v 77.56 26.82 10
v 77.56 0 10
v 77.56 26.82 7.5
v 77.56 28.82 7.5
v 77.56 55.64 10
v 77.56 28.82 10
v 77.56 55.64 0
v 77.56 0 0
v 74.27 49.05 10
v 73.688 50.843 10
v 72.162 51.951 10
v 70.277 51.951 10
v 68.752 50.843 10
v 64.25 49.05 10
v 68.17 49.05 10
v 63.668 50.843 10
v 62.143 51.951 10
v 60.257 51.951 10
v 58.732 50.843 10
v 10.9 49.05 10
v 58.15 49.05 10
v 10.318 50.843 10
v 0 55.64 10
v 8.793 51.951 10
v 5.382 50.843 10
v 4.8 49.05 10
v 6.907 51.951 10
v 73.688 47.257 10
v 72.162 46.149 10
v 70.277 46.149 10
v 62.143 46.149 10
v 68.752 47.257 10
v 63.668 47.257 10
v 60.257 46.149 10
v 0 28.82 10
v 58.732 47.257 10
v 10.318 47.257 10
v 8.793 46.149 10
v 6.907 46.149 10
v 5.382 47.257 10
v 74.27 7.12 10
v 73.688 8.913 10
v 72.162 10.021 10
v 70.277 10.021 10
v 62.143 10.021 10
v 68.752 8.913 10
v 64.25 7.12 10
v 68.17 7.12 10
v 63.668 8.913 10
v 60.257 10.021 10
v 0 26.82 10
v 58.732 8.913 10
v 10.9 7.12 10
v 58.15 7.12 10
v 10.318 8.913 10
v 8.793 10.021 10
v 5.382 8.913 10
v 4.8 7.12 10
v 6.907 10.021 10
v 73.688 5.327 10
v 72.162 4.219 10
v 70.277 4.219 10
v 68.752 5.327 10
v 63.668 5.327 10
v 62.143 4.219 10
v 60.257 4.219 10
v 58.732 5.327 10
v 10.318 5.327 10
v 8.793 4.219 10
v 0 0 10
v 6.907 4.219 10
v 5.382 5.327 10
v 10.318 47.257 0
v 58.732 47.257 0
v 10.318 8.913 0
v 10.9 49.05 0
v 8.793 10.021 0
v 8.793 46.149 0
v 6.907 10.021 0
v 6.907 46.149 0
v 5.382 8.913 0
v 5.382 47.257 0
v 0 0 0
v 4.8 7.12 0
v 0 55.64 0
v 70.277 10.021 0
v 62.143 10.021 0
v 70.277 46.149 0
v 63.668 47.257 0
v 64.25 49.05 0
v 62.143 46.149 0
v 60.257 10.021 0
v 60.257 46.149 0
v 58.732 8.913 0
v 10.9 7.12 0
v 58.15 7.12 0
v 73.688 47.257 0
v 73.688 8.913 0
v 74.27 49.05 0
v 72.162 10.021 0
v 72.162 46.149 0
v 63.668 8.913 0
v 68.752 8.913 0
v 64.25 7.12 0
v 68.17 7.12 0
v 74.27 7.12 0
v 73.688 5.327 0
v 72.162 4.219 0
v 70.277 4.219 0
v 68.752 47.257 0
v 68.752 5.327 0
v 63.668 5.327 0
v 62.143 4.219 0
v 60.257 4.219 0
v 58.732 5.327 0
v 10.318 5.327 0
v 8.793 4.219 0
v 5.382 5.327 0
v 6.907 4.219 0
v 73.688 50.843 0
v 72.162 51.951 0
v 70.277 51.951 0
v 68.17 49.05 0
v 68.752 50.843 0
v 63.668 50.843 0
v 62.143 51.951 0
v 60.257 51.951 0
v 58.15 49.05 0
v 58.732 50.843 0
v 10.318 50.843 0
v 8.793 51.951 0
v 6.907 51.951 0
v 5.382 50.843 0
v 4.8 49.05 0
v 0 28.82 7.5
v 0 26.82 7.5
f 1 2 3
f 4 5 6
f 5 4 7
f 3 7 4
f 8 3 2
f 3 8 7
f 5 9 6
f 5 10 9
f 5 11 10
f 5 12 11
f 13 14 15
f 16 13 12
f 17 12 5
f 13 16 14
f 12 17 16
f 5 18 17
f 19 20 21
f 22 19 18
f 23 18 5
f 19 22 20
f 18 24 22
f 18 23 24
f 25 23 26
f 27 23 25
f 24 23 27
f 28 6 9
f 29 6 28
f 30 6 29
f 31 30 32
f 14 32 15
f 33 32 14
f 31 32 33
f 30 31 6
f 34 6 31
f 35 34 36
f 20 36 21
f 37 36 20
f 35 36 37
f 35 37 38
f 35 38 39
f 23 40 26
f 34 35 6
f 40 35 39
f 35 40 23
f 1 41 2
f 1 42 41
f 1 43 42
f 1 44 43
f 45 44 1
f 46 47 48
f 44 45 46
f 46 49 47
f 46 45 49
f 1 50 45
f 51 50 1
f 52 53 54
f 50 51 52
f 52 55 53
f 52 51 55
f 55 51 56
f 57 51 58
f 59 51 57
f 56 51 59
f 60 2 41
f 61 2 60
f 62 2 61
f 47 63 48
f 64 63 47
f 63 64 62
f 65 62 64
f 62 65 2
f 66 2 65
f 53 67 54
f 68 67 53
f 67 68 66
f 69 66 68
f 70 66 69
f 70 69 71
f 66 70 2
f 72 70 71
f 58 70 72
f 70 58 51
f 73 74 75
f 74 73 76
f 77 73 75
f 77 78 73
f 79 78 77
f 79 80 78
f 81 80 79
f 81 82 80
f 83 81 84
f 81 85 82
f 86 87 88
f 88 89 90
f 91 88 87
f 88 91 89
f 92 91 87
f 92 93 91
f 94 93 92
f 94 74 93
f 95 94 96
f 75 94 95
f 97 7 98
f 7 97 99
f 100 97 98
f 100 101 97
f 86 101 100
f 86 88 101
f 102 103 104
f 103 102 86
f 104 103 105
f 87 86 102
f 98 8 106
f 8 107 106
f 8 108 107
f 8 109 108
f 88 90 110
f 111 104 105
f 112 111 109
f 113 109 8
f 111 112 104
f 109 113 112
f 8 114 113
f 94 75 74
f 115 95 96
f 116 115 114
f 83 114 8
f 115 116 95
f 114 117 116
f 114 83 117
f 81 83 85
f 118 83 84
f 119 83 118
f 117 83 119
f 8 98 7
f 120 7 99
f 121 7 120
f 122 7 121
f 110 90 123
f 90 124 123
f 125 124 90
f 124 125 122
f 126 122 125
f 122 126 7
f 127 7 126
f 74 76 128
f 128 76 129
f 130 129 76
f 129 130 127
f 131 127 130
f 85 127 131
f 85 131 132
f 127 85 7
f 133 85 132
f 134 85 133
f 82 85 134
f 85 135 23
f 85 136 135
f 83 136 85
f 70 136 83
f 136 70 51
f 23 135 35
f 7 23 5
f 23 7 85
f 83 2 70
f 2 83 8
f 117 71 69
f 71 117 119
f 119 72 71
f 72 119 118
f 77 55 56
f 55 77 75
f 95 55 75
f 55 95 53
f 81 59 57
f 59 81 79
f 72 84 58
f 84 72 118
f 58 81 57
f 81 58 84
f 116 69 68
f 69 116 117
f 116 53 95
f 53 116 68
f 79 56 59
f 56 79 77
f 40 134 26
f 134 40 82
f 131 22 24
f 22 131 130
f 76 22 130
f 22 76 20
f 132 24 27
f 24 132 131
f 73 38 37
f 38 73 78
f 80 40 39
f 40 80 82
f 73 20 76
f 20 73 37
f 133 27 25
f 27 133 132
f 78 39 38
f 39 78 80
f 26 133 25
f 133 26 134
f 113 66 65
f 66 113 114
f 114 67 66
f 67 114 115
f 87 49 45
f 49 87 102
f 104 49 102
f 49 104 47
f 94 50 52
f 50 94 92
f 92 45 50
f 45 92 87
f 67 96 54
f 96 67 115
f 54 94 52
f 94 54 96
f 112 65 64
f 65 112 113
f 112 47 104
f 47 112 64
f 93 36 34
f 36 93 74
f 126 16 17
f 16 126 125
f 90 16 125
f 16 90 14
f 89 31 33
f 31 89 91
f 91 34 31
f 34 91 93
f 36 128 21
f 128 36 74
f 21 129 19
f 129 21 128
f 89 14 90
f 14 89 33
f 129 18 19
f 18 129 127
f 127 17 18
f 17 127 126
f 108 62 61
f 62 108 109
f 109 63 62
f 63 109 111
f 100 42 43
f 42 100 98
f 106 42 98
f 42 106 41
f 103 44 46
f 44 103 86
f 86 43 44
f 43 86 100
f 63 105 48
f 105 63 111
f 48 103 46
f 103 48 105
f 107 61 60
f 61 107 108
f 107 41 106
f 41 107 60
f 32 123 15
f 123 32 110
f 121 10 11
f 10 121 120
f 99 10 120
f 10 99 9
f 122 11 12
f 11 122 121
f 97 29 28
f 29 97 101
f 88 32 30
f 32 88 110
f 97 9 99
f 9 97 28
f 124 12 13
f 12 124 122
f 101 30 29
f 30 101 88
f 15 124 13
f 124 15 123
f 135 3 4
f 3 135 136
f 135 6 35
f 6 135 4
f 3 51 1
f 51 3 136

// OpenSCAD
difference() {
    cube([77.56, 55.64, 10]);

    // bottom holes
    translate([7.85, 7.12, -5])
        cylinder(20, 3.05, 3.05);
    translate([7.85, 49.05, -5])
        cylinder(20, 3.05, 3.05);

    // top holes (short)
    translate([61.20, 7.12, -5])
        cylinder(20, 3.05, 3.05);
    translate([61.20, 49.05, -5])
        cylinder(20, 3.05, 3.05);

    // top holes (long)
    translate([71.22, 7.12, -5])
        cylinder(20, 3.05, 3.05);
    translate([71.22, 49.05, -5])
        cylinder(20, 3.05, 3.05);
    
    // center line cutout
    translate([0, 26.82, 7.5])
        cube([77.65, 2, 10]);
}
